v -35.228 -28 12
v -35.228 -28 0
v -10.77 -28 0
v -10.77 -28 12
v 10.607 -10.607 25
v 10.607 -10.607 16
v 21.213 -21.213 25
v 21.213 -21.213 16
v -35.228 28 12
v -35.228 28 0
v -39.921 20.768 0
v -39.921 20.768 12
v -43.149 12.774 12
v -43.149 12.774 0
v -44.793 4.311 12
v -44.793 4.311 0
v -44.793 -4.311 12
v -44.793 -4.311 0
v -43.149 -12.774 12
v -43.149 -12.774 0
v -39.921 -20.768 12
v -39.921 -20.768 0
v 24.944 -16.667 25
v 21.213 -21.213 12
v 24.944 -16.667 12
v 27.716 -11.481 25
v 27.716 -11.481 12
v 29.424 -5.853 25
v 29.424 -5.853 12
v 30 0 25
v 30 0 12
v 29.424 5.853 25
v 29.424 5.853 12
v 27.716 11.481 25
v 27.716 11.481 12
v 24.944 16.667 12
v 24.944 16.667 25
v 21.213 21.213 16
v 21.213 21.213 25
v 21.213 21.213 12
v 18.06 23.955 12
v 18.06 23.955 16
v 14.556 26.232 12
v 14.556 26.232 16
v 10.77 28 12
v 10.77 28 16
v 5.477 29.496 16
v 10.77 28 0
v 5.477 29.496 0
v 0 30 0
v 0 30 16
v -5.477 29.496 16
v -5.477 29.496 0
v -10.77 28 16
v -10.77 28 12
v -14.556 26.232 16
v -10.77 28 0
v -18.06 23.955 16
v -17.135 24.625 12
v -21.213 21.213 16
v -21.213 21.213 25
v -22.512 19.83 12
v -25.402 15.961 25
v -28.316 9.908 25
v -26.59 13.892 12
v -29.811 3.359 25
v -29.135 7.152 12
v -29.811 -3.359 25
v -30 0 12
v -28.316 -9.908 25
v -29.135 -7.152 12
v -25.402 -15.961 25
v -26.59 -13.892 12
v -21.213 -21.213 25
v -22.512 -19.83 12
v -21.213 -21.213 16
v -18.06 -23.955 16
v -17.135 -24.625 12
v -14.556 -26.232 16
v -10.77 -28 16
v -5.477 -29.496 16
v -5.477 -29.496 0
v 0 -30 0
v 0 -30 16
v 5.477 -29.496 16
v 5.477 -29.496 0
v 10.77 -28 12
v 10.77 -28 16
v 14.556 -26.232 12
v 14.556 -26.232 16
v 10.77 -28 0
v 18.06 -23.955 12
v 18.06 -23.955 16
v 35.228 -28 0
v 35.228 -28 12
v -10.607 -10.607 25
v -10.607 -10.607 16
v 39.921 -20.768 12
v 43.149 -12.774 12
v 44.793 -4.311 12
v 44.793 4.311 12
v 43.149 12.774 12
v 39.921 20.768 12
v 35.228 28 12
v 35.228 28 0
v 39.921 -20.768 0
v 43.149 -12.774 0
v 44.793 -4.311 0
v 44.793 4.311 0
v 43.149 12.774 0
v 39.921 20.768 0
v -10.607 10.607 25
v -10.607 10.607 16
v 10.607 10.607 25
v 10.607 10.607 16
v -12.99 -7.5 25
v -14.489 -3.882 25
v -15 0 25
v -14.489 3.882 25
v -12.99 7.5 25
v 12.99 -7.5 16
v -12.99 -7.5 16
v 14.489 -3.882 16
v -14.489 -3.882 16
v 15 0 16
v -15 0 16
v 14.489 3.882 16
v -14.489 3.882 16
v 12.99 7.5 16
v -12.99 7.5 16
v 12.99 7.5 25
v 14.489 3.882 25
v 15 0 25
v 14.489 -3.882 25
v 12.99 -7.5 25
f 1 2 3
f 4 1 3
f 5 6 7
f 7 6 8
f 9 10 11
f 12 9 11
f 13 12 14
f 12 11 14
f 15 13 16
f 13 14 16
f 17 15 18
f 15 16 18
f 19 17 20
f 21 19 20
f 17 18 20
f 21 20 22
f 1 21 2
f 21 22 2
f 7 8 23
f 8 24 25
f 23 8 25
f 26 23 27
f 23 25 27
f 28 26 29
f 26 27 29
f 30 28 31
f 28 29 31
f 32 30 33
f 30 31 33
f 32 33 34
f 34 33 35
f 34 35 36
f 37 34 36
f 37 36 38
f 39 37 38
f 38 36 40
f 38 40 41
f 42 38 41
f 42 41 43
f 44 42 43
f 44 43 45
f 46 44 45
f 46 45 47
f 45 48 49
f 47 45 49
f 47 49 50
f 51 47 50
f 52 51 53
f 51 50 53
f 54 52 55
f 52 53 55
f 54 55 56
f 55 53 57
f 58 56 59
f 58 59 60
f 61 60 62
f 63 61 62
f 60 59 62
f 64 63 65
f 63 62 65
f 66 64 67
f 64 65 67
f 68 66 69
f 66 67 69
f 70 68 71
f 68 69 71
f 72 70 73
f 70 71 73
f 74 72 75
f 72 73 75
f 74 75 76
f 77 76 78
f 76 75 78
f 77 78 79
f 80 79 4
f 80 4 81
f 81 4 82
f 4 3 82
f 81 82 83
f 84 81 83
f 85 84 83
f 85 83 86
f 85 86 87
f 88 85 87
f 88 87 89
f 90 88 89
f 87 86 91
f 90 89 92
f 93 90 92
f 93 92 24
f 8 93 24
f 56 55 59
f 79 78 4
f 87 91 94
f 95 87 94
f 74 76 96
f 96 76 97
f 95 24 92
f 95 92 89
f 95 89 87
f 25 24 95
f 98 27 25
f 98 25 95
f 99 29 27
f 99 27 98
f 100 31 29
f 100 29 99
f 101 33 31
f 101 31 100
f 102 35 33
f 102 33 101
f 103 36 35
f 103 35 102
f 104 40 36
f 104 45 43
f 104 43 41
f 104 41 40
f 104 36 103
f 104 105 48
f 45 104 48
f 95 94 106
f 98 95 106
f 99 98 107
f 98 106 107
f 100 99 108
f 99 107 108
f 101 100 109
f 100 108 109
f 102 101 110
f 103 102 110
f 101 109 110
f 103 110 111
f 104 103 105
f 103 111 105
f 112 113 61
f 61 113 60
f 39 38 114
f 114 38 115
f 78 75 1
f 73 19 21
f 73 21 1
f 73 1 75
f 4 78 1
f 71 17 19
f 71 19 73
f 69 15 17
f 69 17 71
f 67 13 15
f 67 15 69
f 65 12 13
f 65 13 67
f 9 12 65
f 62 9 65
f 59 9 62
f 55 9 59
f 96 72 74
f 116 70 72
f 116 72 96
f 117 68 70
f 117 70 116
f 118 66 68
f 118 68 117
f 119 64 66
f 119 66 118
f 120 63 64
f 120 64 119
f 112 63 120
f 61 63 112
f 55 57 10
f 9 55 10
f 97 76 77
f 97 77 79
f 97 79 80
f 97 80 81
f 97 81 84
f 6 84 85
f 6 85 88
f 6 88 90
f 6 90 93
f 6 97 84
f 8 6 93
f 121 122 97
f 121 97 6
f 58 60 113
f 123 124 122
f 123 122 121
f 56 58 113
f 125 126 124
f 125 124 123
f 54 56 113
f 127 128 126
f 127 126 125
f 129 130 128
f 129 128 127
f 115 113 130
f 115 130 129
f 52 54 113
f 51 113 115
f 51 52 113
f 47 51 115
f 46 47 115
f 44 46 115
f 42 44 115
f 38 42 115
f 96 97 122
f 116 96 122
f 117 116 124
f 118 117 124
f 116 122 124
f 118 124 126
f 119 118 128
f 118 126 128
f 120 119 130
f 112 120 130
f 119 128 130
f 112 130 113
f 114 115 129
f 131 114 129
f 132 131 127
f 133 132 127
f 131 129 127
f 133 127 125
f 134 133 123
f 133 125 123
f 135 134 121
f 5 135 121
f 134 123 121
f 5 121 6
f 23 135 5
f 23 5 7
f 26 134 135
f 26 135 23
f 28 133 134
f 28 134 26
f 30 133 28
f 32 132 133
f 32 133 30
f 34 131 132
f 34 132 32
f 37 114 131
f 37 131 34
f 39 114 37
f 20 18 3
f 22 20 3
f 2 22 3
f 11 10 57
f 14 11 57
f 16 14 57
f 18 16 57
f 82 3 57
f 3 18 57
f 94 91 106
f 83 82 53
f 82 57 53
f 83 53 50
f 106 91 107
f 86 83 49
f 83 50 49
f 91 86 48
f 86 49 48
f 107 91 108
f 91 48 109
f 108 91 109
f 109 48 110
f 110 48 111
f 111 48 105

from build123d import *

# Parameters (mm, degrees)
F1_DEPTH = 12
F2_DEPTH = 16
F3_DEPTH = 25


with BuildPart() as f1:
    # F0 (on Top) → F1 (new body)
    with BuildSketch(Plane.XY):
        with BuildLine():
            ThreePointArc((-21.2132034356, 21.2132034356), (-16.3478362021, 25.1544877012), (-10.7703296143, 28))
            Line((-10.7703296143, 28), (-35.2278299076, 28))
            ThreePointArc((-35.2278299076, 28), (-45, 0), (-35.2278299076, -28))
            Line((-35.2278299076, -28), (-10.7703296143, -28))
            ThreePointArc((-10.7703296143, -28), (-16.3478362021, -25.1544877012), (-21.2132034356, -21.2132034356))
            ThreePointArc((-21.2132034356, -21.2132034356), (-30, 0), (-21.2132034356, 21.2132034356))
        make_face()
    extrude(amount=F1_DEPTH)



with BuildPart() as f1b:
    # F0 (on Top) → F1, piece 2 (new body)
    with BuildSketch(Plane.XY):
        with BuildLine():
            ThreePointArc((21.2132034356, 21.2132034356), (27.7163859753, 11.480502971), (30, 0))
            ThreePointArc((30, 0), (27.7163859753, -11.480502971), (21.2132034356, -21.2132034356))
            ThreePointArc((21.2132034356, -21.2132034356), (16.3478362021, -25.1544877012), (10.7703296143, -28))
            Line((10.7703296143, -28), (35.2278299076, -28))
            ThreePointArc((35.2278299076, -28), (45, 0), (35.2278299076, 28))
            Line((35.2278299076, 28), (10.7703296143, 28))
            ThreePointArc((10.7703296143, 28), (16.3478362021, 25.1544877012), (21.2132034356, 21.2132034356))
        make_face()
    extrude(amount=F1_DEPTH)


with BuildPart() as f1_1:
    add(f1.part)

    add(f1b.part)  # F2 merges F1b
    # F0 (on Top) → F2 (join)
    with BuildSketch(Plane.XY):
        with BuildLine():
            Line((10.6066017178, 10.6066017178), (21.2132034356, 21.2132034356))
            ThreePointArc((21.2132034356, 21.2132034356), (16.3478362021, 25.1544877012), (10.7703296143, 28))
            ThreePointArc((10.7703296143, 28), (0, 30), (-10.7703296143, 28))
            ThreePointArc((-10.7703296143, 28), (-16.3478362021, 25.1544877012), (-21.2132034356, 21.2132034356))
            Line((-21.2132034356, 21.2132034356), (-10.6066017178, 10.6066017178))
            ThreePointArc((-10.6066017178, 10.6066017178), (-15, 0), (-10.6066017178, -10.6066017178))
            Line((-10.6066017178, -10.6066017178), (-21.2132034356, -21.2132034356))
            ThreePointArc((-21.2132034356, -21.2132034356), (-16.3478362021, -25.1544877012), (-10.7703296143, -28))
            ThreePointArc((-10.7703296143, -28), (0, -30), (10.7703296143, -28))
            ThreePointArc((10.7703296143, -28), (16.3478362021, -25.1544877012), (21.2132034356, -21.2132034356))
            Line((21.2132034356, -21.2132034356), (10.6066017178, -10.6066017178))
            ThreePointArc((10.6066017178, -10.6066017178), (15, 0), (10.6066017178, 10.6066017178))
        make_face()
    extrude(amount=F2_DEPTH)

    # F0 (on Top) → F3 (join)
    with BuildSketch(Plane.XY):
        with BuildLine():
            ThreePointArc((21.2132034356, -21.2132034356), (27.7163859753, -11.480502971), (30, 0))
            ThreePointArc((30, 0), (27.7163859753, 11.480502971), (21.2132034356, 21.2132034356))
            Line((21.2132034356, 21.2132034356), (10.6066017178, 10.6066017178))
            ThreePointArc((10.6066017178, 10.6066017178), (15, 0), (10.6066017178, -10.6066017178))
            Line((10.6066017178, -10.6066017178), (21.2132034356, -21.2132034356))
        make_face()
        with BuildLine():
            Line((-10.6066017178, 10.6066017178), (-21.2132034356, 21.2132034356))
            ThreePointArc((-21.2132034356, 21.2132034356), (-30, 0), (-21.2132034356, -21.2132034356))
            Line((-21.2132034356, -21.2132034356), (-10.6066017178, -10.6066017178))
            ThreePointArc((-10.6066017178, -10.6066017178), (-15, 0), (-10.6066017178, 10.6066017178))
        make_face()
    extrude(amount=F3_DEPTH)


solid = f1_1.part
